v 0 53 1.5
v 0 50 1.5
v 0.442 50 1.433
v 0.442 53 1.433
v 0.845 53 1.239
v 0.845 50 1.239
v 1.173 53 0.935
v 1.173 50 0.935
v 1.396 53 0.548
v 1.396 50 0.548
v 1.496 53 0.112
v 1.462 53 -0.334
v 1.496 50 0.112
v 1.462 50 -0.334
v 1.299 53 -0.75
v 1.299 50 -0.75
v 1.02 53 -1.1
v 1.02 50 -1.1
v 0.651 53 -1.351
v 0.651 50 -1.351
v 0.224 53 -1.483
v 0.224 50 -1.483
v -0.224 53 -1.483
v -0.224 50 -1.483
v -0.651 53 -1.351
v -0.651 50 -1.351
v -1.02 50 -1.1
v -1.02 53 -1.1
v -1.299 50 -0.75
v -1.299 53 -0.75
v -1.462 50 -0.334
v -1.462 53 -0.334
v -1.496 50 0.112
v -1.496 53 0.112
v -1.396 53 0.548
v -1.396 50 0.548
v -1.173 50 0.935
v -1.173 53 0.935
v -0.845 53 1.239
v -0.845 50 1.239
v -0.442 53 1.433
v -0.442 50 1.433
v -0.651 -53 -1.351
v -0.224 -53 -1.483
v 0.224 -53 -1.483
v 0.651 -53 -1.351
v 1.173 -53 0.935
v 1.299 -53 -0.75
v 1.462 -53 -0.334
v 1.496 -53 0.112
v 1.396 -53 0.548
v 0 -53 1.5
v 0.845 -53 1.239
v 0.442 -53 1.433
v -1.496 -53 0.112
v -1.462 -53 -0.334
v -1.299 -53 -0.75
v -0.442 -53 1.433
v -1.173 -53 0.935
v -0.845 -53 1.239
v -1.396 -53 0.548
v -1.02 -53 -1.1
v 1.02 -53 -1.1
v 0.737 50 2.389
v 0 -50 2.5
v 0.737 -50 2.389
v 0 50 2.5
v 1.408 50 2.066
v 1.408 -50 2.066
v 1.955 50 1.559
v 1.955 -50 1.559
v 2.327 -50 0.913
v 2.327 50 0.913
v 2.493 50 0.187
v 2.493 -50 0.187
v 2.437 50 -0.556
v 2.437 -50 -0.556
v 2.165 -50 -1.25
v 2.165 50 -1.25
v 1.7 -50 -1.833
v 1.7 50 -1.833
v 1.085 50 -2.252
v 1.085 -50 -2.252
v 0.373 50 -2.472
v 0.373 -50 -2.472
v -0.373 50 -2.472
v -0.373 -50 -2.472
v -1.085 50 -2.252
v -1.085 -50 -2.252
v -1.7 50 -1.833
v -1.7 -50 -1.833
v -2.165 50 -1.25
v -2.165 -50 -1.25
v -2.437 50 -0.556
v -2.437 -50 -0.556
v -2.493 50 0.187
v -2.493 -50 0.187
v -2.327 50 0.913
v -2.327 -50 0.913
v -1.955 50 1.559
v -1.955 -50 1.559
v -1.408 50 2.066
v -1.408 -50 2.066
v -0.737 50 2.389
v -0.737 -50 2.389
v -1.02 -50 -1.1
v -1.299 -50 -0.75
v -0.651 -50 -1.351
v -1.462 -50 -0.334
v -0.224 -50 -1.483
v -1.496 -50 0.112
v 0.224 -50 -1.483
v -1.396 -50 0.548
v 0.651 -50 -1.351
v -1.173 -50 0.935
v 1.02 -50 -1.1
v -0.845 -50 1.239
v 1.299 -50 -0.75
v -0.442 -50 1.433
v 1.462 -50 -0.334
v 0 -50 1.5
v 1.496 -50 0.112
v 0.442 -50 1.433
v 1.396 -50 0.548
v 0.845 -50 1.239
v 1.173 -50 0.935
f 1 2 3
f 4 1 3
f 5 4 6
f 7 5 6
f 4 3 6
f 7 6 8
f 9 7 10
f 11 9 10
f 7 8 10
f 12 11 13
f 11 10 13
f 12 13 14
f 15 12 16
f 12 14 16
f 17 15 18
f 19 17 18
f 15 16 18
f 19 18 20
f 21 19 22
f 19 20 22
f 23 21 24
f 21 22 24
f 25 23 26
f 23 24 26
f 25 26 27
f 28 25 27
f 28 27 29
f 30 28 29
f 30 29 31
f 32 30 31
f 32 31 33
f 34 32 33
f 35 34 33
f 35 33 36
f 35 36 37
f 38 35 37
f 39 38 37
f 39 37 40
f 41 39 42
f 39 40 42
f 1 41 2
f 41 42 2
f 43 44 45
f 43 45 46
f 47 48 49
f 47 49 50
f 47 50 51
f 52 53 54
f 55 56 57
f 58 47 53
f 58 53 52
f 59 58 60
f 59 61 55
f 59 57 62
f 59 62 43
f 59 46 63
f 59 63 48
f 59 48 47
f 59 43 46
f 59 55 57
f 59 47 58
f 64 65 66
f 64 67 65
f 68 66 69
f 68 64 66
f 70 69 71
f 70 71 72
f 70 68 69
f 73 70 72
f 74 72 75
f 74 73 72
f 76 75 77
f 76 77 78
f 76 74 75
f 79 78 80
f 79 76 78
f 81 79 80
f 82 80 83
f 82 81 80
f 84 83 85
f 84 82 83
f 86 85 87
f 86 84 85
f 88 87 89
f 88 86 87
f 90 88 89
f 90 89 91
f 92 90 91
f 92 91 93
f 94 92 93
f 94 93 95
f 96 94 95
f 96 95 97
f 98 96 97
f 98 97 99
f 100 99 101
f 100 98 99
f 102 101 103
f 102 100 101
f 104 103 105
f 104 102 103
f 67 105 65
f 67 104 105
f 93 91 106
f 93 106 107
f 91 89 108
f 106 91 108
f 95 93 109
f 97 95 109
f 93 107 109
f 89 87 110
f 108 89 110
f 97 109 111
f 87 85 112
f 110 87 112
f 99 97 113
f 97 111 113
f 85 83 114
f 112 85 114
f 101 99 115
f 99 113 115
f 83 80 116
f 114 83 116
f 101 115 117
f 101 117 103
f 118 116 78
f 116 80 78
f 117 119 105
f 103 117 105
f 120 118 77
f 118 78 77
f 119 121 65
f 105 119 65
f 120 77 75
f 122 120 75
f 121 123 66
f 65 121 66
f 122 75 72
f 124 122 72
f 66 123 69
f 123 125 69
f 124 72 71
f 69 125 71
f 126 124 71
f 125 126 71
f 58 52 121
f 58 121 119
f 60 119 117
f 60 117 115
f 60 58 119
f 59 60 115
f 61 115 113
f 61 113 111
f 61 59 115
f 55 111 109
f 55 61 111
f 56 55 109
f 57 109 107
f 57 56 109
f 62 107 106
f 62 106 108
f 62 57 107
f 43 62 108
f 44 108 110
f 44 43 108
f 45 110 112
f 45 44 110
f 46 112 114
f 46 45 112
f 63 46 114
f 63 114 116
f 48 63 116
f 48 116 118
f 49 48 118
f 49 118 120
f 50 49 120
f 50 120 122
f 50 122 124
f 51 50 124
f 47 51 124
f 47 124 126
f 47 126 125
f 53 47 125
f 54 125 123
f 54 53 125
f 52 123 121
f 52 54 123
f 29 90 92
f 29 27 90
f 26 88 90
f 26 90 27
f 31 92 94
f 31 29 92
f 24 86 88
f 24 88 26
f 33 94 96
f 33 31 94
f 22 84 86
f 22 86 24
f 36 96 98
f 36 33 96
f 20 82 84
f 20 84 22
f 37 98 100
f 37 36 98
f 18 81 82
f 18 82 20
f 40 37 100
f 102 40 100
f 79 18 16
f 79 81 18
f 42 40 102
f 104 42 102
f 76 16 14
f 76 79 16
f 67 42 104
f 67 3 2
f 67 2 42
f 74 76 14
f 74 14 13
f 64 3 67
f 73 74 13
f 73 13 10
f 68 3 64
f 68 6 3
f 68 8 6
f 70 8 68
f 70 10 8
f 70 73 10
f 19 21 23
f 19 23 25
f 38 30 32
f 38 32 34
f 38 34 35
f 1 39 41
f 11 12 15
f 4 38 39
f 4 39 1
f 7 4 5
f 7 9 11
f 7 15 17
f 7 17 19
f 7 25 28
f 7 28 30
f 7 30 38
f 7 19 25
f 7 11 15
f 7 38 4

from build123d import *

# Parameters (mm, degrees)
SKETCH_1_R      = 2.5
EXTRUDE_2_DEPTH = 50
SKETCH_2_R      = 1.5
EXTRUDE_3_DEPTH = 3
EXTRUDE_START   = 3
SKETCH_3_R      = 1.5
EXTRUDE_4_DEPTH = 3


with BuildPart() as part:
    # 草图1 → 凸台-拉伸2 (new, symmetric)
    with BuildSketch(Plane(origin=(0, 0, 0), x_dir=(1, 0, 0), z_dir=(0, 1, 0))):
        with Locations(Location((0, 0, 0), (0, 0, 270))):
            Circle(SKETCH_1_R)
    extrude(amount=EXTRUDE_2_DEPTH, both=True)

    # 草图2 → 凸台-拉伸3 (add)
    with BuildSketch(Plane(origin=(0, 50, 0), x_dir=(1, 0, 0), z_dir=(0, 1, 0))):
        with Locations(Location((0, 0, 0), (0, 0, 270))):
            Circle(SKETCH_2_R)
    extrude(amount=EXTRUDE_3_DEPTH)

    # 草图3 → 凸台-拉伸4 (add)
    with BuildSketch(Plane.XZ.offset(50).offset(EXTRUDE_START)):
        with Locations(Location((0, 0, 0), (0, 0, 90))):
            Circle(SKETCH_3_R)
    extrude(amount=-EXTRUDE_4_DEPTH)


solid = part.part
